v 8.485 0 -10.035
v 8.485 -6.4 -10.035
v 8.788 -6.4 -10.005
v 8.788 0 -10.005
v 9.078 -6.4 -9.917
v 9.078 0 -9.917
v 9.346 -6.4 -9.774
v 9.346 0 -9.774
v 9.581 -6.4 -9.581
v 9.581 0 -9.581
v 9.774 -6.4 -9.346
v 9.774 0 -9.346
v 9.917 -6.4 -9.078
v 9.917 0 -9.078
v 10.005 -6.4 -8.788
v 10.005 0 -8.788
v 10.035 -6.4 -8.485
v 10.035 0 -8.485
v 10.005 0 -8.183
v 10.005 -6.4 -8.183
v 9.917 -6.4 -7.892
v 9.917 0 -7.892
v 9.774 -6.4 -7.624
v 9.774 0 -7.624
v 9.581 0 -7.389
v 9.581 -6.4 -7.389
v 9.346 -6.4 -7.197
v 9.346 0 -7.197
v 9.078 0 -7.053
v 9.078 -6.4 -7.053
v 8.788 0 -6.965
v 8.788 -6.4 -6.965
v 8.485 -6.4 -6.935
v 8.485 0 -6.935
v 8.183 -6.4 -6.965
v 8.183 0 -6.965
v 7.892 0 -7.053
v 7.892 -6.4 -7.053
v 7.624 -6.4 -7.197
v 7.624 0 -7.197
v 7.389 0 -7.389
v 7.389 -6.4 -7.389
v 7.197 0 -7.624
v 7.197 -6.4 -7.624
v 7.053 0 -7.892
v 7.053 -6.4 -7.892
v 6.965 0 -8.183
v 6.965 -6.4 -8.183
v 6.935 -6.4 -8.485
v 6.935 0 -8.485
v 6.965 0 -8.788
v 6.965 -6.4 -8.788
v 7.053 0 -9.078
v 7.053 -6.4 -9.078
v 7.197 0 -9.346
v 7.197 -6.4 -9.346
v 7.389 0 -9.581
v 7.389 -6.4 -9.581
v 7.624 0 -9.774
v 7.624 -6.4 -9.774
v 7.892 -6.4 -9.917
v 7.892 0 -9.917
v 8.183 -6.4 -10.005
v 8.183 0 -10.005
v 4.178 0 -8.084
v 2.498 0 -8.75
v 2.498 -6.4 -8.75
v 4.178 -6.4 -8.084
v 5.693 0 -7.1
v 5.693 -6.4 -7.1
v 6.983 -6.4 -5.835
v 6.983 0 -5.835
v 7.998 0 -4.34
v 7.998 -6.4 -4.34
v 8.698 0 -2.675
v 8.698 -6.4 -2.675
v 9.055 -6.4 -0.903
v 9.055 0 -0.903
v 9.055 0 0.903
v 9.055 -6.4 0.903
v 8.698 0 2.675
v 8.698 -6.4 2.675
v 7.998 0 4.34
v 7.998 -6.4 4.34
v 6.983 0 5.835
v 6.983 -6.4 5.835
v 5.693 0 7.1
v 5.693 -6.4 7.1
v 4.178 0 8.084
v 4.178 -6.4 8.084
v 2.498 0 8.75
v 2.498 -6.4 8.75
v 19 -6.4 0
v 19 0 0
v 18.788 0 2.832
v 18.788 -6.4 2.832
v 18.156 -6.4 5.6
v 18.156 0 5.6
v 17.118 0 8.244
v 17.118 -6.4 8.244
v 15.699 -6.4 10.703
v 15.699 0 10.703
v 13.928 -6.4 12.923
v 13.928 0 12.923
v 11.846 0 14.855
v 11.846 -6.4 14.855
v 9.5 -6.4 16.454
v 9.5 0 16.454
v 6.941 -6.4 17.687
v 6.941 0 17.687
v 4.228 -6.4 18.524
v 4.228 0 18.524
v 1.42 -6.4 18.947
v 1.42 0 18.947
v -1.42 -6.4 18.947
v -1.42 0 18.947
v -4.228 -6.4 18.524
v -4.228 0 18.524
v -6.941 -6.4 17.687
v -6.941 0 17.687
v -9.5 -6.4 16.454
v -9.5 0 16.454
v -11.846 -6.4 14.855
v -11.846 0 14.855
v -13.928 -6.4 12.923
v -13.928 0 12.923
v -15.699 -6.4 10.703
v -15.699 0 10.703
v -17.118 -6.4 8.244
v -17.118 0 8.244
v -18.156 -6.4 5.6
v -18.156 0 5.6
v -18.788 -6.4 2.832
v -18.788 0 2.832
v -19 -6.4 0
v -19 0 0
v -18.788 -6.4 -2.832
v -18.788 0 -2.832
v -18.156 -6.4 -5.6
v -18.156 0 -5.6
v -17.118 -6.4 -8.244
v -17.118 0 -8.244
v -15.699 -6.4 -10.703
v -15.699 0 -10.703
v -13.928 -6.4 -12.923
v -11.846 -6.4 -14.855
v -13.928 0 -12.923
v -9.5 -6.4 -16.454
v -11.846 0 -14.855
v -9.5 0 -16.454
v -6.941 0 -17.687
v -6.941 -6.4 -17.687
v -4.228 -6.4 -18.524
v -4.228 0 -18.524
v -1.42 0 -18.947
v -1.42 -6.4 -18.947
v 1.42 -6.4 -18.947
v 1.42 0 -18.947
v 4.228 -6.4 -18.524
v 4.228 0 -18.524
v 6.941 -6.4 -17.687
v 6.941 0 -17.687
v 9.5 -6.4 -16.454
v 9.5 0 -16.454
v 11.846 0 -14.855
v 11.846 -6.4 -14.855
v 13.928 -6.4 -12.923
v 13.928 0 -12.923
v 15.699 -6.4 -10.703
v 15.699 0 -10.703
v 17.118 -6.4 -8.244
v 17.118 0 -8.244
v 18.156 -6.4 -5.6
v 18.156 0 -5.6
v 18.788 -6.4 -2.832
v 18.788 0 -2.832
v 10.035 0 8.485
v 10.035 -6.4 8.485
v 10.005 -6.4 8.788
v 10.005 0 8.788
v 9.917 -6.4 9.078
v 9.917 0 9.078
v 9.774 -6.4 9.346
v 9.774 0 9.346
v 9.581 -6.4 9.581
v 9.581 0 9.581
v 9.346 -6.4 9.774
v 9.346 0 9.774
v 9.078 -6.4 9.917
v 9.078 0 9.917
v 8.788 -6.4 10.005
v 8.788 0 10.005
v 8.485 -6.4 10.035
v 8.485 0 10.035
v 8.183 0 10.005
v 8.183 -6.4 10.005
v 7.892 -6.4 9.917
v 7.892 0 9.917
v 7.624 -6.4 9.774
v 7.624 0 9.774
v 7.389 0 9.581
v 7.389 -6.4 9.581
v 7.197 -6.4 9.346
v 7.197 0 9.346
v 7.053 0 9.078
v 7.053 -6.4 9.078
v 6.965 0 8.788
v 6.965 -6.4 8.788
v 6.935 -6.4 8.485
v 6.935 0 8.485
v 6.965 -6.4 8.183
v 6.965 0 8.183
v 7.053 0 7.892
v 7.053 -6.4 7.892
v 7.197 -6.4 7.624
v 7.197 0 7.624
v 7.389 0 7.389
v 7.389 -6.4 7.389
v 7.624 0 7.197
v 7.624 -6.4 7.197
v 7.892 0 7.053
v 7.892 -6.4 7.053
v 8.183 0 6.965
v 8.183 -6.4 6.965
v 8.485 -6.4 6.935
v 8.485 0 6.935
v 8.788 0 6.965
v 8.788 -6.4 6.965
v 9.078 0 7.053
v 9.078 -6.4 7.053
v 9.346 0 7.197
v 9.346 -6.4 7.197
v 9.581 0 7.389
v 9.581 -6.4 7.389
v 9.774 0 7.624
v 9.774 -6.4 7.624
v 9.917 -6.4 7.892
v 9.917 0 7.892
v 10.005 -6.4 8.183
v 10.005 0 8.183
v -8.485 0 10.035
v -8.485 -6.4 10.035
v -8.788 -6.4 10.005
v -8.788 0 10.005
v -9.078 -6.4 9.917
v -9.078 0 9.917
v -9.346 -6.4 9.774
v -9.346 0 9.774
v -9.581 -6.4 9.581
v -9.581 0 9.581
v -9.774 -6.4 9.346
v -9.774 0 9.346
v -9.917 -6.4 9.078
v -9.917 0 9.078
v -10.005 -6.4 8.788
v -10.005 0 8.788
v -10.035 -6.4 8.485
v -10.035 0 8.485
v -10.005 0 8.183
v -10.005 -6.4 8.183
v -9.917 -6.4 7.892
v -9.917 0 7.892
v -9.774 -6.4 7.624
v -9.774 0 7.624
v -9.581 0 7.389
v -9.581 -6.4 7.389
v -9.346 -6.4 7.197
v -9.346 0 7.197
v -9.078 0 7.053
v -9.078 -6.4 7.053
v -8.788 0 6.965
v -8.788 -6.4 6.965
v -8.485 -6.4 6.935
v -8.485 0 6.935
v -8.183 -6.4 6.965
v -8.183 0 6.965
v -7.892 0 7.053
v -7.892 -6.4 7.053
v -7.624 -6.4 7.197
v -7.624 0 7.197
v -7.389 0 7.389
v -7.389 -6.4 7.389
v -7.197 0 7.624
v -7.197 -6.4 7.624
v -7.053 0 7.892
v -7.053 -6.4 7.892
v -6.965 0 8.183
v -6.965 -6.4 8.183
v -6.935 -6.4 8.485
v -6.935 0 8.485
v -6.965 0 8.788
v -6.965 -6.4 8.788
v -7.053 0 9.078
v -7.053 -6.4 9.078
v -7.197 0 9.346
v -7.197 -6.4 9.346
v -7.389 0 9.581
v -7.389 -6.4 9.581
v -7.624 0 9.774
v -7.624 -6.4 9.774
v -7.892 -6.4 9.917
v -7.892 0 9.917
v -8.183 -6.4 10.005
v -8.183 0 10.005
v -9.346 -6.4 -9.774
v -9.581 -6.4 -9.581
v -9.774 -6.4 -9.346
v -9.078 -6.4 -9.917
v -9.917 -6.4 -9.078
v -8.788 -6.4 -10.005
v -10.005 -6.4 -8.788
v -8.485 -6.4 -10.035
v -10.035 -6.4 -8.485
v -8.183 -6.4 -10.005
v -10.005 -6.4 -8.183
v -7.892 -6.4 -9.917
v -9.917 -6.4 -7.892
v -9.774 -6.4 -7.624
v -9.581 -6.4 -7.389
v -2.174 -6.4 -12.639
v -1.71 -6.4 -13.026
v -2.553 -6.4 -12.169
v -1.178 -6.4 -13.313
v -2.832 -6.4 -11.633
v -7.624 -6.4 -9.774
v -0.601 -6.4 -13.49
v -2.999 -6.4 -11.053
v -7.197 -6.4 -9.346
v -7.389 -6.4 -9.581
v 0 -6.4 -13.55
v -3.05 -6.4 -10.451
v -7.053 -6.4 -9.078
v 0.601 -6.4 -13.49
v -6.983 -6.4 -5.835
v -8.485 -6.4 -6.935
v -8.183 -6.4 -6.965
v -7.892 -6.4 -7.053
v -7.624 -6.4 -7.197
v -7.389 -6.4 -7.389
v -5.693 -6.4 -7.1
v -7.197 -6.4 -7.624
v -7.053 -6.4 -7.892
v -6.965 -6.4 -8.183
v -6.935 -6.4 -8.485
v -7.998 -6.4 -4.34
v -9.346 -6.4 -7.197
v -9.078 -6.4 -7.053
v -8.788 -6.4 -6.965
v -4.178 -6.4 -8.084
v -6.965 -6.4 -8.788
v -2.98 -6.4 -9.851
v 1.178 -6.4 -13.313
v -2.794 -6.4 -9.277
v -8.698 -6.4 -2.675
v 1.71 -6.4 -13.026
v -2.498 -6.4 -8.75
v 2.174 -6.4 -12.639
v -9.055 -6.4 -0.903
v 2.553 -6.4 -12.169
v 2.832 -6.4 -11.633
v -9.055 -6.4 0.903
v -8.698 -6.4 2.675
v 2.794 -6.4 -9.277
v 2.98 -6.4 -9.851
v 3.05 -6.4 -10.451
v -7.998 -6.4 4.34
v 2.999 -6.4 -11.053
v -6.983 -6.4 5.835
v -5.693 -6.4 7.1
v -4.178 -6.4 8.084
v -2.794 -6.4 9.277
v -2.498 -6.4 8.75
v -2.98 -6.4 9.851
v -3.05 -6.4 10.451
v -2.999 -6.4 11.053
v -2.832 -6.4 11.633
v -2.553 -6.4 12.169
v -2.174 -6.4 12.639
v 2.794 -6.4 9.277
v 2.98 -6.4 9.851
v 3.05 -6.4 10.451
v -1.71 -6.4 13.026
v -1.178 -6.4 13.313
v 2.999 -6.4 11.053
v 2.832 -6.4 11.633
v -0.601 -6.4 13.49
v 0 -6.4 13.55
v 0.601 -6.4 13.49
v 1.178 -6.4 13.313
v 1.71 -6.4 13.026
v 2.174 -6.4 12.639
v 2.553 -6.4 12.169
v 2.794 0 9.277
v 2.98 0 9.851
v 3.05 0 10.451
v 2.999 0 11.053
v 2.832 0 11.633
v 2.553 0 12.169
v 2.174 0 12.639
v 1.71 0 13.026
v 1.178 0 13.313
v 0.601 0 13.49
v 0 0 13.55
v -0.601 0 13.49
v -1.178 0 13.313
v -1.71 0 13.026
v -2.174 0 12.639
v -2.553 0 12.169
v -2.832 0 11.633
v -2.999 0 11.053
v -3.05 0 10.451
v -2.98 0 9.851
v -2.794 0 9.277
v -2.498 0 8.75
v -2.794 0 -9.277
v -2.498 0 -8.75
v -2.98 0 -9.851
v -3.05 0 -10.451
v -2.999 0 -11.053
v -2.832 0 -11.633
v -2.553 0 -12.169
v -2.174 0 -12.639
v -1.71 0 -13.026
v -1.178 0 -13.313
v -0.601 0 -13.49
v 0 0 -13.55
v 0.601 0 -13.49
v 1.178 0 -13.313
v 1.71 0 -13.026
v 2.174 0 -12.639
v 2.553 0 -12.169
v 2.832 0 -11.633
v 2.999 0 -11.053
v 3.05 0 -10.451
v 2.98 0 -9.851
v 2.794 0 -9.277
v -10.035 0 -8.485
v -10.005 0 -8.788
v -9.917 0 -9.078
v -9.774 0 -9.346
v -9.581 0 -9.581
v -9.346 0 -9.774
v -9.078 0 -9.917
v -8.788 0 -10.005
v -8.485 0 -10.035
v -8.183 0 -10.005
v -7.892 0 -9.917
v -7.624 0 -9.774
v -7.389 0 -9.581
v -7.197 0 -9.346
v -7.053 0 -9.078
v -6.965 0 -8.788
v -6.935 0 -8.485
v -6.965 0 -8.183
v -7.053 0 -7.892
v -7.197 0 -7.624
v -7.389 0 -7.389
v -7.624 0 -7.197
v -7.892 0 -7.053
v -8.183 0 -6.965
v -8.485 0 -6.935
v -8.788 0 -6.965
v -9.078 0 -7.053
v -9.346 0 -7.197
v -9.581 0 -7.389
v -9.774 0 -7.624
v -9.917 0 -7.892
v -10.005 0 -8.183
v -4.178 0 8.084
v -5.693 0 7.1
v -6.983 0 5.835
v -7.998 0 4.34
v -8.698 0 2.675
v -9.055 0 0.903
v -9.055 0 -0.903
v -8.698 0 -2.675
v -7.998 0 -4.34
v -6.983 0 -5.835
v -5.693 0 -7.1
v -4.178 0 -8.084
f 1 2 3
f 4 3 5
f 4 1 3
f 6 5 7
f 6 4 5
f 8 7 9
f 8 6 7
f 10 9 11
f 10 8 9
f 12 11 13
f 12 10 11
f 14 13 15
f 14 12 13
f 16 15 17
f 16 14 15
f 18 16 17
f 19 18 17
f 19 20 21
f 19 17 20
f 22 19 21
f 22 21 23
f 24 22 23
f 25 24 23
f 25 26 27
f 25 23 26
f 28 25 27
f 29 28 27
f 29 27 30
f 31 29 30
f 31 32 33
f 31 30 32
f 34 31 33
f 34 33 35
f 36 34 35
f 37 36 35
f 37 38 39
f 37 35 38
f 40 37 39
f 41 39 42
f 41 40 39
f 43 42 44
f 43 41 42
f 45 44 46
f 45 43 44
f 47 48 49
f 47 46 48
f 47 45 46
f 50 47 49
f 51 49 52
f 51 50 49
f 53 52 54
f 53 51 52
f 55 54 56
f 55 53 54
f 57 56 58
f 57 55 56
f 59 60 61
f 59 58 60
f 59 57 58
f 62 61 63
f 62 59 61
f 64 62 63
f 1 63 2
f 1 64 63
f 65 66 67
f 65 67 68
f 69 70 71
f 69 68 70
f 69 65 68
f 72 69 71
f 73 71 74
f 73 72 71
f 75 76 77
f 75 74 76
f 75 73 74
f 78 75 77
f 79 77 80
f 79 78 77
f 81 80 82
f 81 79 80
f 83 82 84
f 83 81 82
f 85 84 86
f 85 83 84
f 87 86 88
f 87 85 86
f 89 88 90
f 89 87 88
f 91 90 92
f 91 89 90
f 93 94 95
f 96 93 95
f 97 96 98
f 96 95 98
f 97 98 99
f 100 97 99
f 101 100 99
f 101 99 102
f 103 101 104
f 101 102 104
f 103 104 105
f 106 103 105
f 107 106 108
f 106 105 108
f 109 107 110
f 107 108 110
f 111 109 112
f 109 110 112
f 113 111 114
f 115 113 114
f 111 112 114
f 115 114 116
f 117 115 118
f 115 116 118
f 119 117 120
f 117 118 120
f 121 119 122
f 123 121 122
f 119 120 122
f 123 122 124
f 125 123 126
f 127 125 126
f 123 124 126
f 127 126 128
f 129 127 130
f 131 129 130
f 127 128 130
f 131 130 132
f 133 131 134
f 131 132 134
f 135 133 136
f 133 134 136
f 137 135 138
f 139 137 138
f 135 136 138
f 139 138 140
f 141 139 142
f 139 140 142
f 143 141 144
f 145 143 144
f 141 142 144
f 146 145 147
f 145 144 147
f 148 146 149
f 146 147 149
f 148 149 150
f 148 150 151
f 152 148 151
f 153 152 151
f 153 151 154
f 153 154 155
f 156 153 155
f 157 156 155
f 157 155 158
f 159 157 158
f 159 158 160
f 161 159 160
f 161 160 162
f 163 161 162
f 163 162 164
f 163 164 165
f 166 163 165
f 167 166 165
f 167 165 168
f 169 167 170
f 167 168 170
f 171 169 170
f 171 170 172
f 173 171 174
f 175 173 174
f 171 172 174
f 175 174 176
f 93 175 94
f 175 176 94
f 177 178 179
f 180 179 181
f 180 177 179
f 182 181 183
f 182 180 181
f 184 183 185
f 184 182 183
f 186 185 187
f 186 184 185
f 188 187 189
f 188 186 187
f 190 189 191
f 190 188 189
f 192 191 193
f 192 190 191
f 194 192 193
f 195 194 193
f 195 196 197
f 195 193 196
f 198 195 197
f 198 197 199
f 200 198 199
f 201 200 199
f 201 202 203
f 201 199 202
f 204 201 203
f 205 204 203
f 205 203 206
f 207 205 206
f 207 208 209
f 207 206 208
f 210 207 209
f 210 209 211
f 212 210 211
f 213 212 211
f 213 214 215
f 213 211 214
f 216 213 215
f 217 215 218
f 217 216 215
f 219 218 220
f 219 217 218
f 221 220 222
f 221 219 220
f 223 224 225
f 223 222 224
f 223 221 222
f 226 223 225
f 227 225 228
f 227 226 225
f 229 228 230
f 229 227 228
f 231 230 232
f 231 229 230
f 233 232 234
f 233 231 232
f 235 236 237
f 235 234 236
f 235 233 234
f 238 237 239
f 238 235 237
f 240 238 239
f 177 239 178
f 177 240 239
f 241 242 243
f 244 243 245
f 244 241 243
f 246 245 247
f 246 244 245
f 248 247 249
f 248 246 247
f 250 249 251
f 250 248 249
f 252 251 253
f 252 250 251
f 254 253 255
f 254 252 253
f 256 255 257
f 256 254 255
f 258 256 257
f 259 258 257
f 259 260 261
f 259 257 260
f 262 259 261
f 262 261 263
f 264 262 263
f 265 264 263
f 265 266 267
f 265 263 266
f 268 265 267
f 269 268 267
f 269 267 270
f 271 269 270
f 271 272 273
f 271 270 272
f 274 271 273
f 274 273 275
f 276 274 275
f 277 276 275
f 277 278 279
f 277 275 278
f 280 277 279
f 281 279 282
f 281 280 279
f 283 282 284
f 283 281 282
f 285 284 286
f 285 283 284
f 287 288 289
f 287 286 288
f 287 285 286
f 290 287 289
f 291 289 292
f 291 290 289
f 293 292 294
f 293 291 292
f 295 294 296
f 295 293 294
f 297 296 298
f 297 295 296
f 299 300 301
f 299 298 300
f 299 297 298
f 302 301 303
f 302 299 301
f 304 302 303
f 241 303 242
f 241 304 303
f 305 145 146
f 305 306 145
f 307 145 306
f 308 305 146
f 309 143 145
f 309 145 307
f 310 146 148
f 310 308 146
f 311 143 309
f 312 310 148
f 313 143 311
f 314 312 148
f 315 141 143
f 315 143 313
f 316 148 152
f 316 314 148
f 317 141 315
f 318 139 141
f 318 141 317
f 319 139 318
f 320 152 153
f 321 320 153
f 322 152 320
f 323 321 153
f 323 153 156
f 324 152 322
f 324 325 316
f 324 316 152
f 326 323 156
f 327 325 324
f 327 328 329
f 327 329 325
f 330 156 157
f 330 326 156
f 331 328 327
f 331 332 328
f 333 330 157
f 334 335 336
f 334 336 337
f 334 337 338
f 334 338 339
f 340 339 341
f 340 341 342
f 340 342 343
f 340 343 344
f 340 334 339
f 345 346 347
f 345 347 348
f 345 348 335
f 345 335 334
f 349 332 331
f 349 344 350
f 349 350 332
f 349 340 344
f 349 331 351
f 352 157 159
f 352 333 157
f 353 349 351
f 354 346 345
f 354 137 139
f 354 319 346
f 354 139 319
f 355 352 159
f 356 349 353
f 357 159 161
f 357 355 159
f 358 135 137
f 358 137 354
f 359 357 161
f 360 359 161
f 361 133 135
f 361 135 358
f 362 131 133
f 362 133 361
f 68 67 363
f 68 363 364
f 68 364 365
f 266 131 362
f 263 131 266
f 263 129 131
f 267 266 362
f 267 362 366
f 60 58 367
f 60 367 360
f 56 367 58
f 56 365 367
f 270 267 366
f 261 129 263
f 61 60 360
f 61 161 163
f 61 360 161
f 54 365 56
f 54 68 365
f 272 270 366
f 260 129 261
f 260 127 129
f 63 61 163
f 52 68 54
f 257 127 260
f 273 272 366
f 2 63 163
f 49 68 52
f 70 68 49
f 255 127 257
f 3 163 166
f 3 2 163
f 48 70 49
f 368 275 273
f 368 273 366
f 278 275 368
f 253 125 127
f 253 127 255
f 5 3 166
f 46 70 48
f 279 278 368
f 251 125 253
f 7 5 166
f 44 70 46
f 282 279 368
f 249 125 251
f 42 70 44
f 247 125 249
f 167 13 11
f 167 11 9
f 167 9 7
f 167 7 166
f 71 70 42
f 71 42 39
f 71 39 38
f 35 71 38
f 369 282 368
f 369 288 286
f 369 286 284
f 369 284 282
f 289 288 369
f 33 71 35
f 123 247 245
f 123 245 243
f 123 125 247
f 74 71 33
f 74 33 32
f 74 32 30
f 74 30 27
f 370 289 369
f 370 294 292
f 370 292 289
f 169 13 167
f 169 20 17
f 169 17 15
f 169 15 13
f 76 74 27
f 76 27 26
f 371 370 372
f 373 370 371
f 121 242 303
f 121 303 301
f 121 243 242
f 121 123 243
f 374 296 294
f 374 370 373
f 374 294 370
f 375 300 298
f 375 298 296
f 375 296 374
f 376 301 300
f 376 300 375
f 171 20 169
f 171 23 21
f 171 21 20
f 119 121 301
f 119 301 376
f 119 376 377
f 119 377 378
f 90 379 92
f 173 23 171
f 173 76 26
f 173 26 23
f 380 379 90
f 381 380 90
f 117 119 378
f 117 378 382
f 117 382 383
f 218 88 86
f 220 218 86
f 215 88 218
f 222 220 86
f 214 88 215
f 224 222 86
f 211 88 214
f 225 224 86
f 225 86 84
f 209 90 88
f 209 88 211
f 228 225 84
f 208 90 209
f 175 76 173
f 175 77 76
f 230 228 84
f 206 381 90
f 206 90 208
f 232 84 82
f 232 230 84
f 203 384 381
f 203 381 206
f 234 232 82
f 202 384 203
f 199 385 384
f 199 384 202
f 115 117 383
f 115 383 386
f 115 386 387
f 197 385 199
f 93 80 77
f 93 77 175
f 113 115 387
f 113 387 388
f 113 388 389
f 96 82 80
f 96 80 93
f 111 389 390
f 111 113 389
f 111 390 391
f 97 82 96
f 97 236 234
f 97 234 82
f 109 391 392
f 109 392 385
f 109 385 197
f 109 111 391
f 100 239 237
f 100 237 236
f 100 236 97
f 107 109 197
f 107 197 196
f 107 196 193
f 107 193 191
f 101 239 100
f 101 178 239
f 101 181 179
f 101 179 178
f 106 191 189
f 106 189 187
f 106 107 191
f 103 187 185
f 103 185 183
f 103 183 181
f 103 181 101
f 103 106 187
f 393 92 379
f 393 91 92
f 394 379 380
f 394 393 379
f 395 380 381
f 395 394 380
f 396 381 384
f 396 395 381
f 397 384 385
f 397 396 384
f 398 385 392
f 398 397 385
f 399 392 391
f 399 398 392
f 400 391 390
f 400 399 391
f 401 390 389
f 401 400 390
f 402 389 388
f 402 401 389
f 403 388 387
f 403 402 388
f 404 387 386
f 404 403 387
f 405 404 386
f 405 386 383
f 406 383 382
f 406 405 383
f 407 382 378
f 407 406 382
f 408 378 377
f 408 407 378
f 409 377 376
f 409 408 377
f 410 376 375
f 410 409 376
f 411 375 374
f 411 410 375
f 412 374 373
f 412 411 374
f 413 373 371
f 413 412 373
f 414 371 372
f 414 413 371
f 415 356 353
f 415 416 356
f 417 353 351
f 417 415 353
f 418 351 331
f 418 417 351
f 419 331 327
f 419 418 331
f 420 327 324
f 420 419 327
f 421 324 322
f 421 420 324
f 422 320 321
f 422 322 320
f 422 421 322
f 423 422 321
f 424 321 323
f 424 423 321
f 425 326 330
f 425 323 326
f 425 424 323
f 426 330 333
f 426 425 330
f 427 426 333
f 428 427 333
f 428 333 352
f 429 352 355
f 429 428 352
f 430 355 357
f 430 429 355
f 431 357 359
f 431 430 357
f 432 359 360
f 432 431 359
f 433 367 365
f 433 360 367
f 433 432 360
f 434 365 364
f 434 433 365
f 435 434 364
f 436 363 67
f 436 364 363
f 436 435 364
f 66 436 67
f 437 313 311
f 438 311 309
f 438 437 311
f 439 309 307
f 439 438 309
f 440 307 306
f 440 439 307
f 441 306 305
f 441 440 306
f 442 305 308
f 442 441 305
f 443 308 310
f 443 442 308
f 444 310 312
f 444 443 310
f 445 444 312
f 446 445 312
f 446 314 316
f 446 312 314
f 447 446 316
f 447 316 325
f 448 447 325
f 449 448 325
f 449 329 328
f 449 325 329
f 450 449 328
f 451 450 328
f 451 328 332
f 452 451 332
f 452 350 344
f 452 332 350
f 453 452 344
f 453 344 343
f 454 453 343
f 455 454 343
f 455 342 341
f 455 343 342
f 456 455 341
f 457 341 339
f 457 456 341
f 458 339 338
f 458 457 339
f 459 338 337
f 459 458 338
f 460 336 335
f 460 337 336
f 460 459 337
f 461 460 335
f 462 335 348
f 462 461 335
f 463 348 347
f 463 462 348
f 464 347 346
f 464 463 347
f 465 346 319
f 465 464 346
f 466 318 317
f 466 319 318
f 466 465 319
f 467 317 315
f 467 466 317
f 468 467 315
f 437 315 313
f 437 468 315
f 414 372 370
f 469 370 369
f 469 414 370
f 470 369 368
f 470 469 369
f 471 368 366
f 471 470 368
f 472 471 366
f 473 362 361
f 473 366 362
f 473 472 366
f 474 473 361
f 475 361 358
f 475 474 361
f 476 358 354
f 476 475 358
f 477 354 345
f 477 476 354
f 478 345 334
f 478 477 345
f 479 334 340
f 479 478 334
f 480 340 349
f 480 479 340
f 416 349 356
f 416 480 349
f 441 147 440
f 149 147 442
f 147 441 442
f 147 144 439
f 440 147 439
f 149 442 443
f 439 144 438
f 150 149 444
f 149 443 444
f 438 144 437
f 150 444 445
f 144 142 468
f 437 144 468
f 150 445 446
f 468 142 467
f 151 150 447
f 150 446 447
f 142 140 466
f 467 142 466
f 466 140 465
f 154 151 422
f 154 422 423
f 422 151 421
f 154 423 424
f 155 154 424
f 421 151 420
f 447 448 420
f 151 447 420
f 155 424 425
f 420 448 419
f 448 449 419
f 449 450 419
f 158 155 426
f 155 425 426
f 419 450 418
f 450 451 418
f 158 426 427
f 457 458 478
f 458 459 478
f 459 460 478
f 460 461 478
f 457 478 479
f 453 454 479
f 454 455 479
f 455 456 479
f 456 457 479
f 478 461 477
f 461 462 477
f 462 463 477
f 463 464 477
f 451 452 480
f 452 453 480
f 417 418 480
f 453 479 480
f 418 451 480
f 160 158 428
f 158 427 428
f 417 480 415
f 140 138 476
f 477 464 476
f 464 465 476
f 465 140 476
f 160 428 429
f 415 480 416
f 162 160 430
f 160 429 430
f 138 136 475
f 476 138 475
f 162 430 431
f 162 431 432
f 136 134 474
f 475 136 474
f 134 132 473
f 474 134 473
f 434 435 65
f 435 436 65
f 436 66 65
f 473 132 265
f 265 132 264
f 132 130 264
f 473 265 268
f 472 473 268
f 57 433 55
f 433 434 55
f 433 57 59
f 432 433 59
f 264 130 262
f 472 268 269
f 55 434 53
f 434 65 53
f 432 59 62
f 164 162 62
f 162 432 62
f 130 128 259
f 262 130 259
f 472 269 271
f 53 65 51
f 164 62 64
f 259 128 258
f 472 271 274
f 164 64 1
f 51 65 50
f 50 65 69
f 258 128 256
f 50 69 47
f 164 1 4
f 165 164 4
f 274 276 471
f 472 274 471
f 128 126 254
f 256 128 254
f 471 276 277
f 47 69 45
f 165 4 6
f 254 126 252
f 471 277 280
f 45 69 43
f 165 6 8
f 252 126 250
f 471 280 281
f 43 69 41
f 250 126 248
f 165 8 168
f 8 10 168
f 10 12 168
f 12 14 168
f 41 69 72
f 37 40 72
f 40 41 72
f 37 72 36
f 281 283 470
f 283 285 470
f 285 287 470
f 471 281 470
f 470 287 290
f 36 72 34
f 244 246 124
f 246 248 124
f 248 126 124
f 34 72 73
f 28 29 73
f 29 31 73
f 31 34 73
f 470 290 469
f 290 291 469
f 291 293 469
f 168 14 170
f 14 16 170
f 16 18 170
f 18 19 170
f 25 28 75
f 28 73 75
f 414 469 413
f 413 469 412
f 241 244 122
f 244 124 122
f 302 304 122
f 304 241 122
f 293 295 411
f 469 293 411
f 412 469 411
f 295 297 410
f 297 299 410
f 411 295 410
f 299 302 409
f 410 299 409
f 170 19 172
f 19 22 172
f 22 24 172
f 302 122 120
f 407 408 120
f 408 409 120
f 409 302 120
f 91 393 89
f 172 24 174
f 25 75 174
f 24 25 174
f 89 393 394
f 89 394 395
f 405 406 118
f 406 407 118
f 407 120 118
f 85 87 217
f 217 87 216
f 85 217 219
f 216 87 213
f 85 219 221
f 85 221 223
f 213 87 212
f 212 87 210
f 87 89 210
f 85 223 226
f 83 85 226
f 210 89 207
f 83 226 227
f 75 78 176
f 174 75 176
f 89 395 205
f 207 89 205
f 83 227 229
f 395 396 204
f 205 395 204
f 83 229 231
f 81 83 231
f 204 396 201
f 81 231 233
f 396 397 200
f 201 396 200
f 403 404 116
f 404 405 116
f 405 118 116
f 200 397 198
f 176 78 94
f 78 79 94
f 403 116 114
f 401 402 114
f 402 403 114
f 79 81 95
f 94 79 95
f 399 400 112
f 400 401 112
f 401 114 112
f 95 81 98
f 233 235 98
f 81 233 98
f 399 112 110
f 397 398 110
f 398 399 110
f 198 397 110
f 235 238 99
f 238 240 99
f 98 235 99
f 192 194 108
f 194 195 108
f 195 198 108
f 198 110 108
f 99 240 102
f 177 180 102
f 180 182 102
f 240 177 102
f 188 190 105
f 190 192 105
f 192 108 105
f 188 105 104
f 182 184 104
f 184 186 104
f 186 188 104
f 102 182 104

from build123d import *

# Parameters (mm, degrees)
F0_R            = 19
F1_DEPTH        = 6.4
F2_R            = 1.55
F3_DEPTH        = 25.4
F3_COPIES_COUNT = 4
F4_R            = 9.1
F5_DEPTH        = 6.401
F6_R            = 3.05
F7_DEPTH        = 6.401


# Not quite as in the source:
# - a pattern or mirror of a feature is missing from the dataset's text; its kind, count and spacing are read off the source's solid


with BuildPart() as f1:
    # F0 (on Front) → F1 (new body)
    with BuildSketch(Plane.XZ):
        Circle(F0_R)
    extrude(amount=F1_DEPTH)

    # F2 (on Front) → F3 (cut)
    with BuildSketch(Plane.XZ):
        with Locations((8.4852813742, 8.4852813742)):
            Circle(F2_R)
    f3 = extrude(amount=F3_DEPTH, mode=Mode.SUBTRACT)

    # F3_copies: F3 ×4 about axis
    f3_copies_axis = Axis((0, 0, 0), (0, 1, 0))
    for i in range(1, F3_COPIES_COUNT):
        add(f3.rotate(f3_copies_axis, i * 360 / F3_COPIES_COUNT), mode=Mode.SUBTRACT)

    # F4 (on Front) → F5 (cut, through all)
    with BuildSketch(Plane.XZ):
        Circle(F4_R)
    extrude(amount=F5_DEPTH, mode=Mode.SUBTRACT)

    # F6 (on Front) → F7 (cut, through all)
    with BuildSketch(Plane.XZ):
        with Locations((0, 10.5)):
            Circle(F6_R)
        with Locations((0, -10.5)):
            Circle(F6_R)
    extrude(amount=F7_DEPTH, mode=Mode.SUBTRACT)


solid = f1.part
